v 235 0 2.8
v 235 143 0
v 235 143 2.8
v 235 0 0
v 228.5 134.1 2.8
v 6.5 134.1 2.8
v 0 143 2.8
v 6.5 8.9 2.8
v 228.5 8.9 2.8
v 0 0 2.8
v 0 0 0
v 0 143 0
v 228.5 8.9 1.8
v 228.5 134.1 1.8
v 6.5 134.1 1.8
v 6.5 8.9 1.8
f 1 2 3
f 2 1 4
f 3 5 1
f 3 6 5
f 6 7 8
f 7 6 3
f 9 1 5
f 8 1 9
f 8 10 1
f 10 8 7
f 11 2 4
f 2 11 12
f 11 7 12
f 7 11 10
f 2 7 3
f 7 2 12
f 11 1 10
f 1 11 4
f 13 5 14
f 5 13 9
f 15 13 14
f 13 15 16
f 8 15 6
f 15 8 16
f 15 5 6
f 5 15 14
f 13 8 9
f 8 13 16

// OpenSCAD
length = 235;
width = 143;
depth = 2.8;
visible_length = 222;
visible_width = 125.2;

color("lightblue"){
    difference(){
        cube([length,width,depth]);
        translate([(length-visible_length)/2,(width-visible_width)/2,depth-1]){
            cube([visible_length,visible_width,depth]);
        }
    }
}
